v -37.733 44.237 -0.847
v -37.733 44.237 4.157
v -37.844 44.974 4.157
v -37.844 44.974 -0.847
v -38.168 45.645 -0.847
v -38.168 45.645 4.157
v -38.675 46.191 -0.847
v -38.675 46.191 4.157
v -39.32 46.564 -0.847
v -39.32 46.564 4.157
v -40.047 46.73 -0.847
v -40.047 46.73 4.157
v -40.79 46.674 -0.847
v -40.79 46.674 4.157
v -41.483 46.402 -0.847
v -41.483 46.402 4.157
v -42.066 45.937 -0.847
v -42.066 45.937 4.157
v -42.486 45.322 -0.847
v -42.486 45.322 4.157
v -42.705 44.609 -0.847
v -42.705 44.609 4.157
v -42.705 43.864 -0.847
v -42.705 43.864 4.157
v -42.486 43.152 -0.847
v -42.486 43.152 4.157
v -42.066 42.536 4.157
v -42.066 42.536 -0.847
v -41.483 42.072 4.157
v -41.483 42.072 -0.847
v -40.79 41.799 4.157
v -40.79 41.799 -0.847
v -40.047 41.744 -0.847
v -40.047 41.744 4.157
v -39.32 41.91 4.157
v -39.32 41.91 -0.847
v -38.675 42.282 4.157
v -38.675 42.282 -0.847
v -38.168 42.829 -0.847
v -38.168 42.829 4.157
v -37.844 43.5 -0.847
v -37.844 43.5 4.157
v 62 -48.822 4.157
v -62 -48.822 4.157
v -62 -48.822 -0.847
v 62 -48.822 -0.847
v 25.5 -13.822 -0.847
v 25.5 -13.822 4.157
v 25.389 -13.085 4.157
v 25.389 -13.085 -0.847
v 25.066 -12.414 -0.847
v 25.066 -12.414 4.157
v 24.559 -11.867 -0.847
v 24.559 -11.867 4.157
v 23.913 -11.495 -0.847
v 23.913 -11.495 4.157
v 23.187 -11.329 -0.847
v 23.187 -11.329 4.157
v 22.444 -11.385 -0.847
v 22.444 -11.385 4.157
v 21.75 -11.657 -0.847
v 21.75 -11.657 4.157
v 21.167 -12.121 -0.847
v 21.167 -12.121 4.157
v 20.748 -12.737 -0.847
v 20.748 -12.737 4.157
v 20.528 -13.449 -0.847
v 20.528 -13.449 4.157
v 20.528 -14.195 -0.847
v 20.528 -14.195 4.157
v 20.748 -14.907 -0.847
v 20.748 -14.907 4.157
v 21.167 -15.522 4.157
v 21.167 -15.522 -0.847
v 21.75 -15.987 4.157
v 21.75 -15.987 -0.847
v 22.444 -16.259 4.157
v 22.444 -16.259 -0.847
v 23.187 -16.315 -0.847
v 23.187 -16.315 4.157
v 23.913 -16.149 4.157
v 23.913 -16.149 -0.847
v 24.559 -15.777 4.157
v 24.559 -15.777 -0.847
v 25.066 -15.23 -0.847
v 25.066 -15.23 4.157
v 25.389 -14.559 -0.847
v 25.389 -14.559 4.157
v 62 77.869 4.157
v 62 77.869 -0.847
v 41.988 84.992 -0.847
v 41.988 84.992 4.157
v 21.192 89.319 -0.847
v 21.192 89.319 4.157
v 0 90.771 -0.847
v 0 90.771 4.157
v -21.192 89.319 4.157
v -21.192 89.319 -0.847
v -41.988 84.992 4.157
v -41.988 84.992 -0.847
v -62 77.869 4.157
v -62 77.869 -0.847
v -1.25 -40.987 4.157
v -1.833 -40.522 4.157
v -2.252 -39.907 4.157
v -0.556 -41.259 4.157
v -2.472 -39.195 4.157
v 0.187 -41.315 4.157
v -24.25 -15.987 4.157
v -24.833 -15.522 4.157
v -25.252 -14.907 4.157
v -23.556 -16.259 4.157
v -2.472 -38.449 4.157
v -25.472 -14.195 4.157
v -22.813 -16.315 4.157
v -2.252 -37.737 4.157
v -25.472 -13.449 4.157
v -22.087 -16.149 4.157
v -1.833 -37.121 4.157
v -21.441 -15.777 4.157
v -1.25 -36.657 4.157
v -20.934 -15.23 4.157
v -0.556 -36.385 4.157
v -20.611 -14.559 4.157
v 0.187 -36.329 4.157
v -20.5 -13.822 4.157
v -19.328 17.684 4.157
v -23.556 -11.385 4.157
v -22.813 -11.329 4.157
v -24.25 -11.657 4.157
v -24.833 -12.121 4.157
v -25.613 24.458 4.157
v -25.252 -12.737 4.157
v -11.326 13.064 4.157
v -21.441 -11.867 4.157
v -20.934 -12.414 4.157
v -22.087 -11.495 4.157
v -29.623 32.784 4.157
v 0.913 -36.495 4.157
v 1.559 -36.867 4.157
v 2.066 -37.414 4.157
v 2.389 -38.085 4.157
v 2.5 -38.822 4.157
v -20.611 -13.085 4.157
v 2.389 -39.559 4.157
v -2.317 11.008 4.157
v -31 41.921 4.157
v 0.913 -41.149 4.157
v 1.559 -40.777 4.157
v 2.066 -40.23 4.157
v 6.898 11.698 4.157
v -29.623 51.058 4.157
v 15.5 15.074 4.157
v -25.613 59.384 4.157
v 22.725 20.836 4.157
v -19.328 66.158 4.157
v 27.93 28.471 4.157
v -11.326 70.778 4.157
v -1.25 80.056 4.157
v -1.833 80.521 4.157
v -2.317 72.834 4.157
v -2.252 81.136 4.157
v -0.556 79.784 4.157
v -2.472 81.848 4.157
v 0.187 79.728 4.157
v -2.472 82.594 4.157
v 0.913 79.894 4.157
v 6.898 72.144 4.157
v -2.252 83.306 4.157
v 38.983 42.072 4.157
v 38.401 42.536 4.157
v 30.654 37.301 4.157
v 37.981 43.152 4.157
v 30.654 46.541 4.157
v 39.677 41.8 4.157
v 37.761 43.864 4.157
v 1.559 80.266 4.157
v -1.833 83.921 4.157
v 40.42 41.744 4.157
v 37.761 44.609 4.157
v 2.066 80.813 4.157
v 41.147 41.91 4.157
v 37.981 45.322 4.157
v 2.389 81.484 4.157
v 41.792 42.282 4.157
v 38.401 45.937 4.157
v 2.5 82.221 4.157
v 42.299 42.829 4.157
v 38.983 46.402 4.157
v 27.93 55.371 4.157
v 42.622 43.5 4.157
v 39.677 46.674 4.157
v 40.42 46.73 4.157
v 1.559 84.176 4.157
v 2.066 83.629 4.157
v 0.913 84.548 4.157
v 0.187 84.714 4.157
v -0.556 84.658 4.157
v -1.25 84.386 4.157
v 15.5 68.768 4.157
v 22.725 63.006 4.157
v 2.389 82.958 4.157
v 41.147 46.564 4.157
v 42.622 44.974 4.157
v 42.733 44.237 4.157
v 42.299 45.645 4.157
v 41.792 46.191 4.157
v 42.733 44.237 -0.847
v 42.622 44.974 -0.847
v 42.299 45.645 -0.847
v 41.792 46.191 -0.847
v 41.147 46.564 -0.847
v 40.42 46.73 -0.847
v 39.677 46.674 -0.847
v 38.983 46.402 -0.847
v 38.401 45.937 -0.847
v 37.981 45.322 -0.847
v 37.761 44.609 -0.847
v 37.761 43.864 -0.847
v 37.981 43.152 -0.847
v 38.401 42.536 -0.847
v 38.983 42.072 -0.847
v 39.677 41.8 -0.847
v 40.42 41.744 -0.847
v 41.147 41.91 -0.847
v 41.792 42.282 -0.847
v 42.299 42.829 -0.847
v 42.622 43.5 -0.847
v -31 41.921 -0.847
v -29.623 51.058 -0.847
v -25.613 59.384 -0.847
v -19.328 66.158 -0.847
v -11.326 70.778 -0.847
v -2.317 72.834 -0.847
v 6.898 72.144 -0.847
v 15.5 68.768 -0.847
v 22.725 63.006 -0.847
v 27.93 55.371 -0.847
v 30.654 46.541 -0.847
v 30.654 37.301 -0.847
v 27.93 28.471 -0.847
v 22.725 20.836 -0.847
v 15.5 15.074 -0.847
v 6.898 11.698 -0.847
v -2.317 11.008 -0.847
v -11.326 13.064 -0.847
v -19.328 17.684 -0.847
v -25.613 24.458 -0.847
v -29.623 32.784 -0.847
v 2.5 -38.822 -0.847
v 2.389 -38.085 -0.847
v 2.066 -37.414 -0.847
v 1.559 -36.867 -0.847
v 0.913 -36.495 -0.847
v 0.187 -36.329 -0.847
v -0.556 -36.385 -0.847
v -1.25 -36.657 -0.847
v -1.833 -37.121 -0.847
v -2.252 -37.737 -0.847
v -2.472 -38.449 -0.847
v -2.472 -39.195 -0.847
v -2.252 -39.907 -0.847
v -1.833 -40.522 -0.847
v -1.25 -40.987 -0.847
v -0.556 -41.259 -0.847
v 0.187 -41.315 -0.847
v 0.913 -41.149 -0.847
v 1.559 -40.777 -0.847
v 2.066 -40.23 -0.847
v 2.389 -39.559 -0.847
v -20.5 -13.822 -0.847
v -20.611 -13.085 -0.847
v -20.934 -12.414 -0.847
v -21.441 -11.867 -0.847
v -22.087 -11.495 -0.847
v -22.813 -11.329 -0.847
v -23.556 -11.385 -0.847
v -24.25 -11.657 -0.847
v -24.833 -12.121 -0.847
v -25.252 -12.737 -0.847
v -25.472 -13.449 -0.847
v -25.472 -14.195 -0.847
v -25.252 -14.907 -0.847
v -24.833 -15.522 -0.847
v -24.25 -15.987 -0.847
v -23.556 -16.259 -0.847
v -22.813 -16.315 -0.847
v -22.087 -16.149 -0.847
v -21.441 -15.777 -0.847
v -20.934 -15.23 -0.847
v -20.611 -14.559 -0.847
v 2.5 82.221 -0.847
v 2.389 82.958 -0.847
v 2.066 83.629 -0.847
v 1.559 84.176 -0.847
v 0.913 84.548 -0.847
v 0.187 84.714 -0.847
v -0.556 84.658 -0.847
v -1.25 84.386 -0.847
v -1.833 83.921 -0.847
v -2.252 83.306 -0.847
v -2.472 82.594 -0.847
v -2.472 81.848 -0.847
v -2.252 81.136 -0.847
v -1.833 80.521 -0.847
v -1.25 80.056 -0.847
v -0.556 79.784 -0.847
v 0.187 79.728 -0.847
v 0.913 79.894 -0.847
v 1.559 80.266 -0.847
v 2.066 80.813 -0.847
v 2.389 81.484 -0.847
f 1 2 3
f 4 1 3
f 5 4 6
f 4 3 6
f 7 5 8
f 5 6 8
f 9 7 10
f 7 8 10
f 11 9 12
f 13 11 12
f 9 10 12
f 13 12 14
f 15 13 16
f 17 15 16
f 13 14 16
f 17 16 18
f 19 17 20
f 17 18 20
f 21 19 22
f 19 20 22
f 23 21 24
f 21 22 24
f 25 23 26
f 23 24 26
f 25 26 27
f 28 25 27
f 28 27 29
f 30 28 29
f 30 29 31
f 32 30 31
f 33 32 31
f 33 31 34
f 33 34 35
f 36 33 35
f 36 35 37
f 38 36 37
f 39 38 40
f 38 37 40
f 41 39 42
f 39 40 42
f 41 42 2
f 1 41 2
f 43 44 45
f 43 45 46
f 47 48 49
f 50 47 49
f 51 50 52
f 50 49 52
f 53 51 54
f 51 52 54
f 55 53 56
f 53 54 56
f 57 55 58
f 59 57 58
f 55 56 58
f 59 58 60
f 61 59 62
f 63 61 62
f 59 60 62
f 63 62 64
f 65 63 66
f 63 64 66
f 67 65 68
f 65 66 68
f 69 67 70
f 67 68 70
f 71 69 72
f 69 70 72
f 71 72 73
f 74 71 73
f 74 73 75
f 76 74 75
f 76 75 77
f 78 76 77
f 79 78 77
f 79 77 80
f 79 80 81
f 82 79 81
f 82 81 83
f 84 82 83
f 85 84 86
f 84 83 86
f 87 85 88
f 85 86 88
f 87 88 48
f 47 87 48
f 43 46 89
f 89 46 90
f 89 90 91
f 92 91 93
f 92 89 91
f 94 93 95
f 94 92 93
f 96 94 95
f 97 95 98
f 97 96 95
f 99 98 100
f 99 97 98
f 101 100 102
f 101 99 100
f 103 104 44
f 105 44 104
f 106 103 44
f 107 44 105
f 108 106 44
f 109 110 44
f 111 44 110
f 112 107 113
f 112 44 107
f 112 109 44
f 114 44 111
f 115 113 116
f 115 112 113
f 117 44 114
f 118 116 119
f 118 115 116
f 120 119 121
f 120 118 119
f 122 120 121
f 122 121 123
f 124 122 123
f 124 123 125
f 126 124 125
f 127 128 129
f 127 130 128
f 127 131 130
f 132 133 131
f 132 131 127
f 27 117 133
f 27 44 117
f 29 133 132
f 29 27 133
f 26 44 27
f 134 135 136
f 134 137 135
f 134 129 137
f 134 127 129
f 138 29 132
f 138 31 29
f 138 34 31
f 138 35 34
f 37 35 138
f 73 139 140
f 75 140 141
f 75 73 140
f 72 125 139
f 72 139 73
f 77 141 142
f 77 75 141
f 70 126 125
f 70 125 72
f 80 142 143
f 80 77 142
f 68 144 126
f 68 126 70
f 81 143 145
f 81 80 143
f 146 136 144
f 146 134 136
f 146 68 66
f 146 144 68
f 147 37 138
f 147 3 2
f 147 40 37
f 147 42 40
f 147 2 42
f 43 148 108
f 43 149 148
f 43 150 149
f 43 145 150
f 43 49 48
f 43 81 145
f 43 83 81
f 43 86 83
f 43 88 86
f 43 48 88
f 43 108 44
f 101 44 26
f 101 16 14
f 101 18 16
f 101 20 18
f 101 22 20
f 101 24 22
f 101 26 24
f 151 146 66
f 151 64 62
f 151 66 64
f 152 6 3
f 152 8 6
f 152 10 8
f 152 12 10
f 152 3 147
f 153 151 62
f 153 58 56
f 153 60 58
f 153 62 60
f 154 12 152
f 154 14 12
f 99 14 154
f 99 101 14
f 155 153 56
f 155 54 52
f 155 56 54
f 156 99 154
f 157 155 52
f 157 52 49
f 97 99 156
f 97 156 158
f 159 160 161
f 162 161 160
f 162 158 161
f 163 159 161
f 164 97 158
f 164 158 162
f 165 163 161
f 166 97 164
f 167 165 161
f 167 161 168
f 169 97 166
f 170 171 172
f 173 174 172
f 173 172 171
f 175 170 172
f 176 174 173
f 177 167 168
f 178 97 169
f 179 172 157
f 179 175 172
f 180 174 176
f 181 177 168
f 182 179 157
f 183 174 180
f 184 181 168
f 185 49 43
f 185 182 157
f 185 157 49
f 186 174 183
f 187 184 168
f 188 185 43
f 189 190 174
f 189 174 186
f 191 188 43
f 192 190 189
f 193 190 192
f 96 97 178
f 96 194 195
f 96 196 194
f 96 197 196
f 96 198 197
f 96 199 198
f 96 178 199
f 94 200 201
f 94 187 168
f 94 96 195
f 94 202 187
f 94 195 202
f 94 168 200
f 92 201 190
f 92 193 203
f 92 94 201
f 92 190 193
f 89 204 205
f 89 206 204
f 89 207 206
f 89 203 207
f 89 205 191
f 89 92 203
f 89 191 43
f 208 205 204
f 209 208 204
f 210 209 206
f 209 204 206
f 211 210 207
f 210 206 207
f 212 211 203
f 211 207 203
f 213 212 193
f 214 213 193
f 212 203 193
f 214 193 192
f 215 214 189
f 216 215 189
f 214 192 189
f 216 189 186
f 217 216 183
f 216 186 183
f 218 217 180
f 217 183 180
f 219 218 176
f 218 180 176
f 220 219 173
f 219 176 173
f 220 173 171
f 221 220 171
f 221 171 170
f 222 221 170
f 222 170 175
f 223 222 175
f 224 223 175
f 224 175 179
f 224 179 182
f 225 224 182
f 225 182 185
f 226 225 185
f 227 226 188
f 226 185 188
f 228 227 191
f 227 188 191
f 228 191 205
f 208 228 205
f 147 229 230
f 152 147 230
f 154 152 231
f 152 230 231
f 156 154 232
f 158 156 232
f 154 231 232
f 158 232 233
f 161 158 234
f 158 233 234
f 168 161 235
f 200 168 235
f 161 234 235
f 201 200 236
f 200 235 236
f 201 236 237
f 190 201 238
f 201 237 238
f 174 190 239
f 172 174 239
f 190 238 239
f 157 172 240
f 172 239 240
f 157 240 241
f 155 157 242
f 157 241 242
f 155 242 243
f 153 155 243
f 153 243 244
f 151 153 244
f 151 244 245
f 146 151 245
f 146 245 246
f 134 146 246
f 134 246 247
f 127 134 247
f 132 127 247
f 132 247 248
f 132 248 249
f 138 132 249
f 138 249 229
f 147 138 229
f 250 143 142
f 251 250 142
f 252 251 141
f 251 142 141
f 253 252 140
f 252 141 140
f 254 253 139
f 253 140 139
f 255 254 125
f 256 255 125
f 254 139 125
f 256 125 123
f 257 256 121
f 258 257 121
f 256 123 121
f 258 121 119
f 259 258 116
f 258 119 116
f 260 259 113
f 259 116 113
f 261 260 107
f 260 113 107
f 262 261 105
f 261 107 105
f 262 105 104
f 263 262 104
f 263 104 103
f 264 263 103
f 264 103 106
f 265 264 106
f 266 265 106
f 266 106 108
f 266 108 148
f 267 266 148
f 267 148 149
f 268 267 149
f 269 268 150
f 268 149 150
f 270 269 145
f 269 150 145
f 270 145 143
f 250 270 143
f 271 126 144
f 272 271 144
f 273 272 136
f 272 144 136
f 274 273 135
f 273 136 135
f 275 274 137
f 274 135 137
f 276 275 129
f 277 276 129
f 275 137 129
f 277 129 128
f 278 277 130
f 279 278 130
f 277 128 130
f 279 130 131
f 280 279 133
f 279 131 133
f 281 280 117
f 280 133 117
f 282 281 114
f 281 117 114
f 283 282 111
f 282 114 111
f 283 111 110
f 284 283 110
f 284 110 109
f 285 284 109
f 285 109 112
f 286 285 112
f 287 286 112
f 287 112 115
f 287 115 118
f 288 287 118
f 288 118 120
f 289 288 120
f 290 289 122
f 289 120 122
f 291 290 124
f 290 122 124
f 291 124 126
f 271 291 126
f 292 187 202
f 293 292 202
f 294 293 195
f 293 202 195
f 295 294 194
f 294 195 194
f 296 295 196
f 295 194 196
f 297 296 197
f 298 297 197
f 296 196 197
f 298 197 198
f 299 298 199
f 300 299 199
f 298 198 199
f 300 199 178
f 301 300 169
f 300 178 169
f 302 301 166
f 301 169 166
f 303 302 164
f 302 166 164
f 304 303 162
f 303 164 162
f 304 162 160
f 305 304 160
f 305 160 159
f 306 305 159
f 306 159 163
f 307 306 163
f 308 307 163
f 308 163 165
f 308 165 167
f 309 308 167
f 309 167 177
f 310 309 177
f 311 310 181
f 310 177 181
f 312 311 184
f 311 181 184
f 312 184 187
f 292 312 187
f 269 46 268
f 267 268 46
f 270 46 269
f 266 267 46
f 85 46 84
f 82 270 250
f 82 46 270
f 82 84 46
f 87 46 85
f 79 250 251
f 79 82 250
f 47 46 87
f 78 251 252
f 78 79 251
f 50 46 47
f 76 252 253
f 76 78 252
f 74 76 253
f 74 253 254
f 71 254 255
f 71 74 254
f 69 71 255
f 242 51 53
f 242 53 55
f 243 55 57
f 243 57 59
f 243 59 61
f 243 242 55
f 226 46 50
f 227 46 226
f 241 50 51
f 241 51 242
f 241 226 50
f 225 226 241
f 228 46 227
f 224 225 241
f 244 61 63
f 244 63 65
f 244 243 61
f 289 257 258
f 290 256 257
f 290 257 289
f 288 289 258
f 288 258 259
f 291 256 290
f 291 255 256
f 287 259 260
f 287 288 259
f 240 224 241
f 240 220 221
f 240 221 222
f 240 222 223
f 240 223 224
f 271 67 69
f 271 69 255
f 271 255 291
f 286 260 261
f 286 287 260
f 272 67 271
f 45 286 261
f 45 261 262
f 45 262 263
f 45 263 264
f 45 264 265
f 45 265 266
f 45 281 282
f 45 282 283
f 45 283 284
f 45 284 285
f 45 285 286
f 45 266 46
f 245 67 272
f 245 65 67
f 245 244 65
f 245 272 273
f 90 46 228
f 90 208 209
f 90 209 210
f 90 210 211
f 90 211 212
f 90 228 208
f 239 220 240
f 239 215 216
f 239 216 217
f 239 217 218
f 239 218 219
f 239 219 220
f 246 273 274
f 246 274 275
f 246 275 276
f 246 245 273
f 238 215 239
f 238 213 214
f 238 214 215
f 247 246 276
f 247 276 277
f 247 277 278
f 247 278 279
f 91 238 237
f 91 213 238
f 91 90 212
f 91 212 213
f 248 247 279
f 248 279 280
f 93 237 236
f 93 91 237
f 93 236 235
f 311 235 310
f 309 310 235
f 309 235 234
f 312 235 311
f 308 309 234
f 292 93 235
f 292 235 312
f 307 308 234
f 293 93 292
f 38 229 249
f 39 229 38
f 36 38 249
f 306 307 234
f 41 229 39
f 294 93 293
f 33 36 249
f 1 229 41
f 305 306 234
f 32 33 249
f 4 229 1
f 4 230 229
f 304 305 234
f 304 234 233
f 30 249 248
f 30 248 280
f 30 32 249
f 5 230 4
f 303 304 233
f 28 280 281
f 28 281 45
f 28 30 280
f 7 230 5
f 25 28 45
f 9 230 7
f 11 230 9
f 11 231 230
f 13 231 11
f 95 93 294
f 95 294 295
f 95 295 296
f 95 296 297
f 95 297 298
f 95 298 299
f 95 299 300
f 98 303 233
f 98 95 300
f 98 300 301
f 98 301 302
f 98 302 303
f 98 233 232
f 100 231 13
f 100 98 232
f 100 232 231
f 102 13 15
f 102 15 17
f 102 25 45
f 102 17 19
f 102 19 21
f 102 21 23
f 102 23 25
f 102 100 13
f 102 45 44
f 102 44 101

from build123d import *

# Parameters (mm, degrees)
SKETCH1_W           = 70
SKETCH1_H           = 105
BOSS_EXTRUDE1_DEPTH = 3
SKETCH2_R           = 17.5
CUT_EXTRUDE3_DEPTH  = 3
CUT_EXTRUDE6_DEPTH  = 10
SCALE1_SCALE        = 1.771428571
SKETCH6_R           = 30.999999993
CUT_EXTRUDE7_DEPTH  = 0.31
SKETCH7_W           = 123.99999997
SKETCH7_H           = 38.57142855
CUT_EXTRUDE8_DEPTH  = 10
SKETCH9_R           = 2.5
CUT_EXTRUDE9_DEPTH  = 5.004285713
SKETCH10_R          = 2.5
CUT_EXTRUDE10_DEPTH = 5.004285713


with BuildPart() as part:
    # Sketch1 → Boss-Extrude1 (new body)
    with BuildSketch(Plane.XY):
        Rectangle(SKETCH1_W, SKETCH1_H)
    extrude(amount=BOSS_EXTRUDE1_DEPTH)

    # Sketch2 → Cut-Extrude3 (cut)
    with BuildSketch(Plane(origin=(0, 0, 0), x_dir=(-1, 0, 0), z_dir=(0, 0, -1))):
        with Locations((0, 20.5)):
            Circle(SKETCH2_R)
    extrude(amount=-CUT_EXTRUDE3_DEPTH, mode=Mode.SUBTRACT)

    # Sketch5 → Cut-Extrude6 (cut)
    with BuildSketch(Plane.XY.offset(3)):
        with BuildLine():
            Line((-35, 40.793543502), (-35, 52.5))
            Line((-35, 52.5), (35, 52.5))
            Line((35, 52.5), (35, 40.793543502))
            ThreePointArc((35, 40.793543502), (0, 48.07644174), (-35, 40.793543502))
        make_face()
    extrude(amount=-CUT_EXTRUDE6_DEPTH, mode=Mode.SUBTRACT)


with BuildPart() as part_1:
    # Scale1: scaled about (0, -7.267874882, 1.5)
    add(part.part.scale(SCALE1_SCALE).moved(Location((0, 5.606646334, -1.157142856))))

    # Sketch6 → Cut-Extrude7 (cut)
    with BuildSketch(Plane(origin=(0, 0, -1.157142856), x_dir=(-1, 0, 0), z_dir=(0, 0, -1))):
        with BuildLine():
            Line((61.999999985, -87.393353643), (61.999999985, 77.869494806))
            ThreePointArc((61.999999985, 77.869494806), (0, 90.770628825), (-61.999999985, 77.869494806))
            Line((-61.999999985, 77.869494806), (-61.999999985, -87.393353643))
            Line((-61.999999985, -87.393353643), (61.999999985, -87.393353643))
        make_face()
        with Locations((0, 41.92093204)):
            Circle(SKETCH6_R, mode=Mode.SUBTRACT)
    extrude(amount=-CUT_EXTRUDE7_DEPTH, mode=Mode.SUBTRACT)

    # Sketch7 → Cut-Extrude8 (cut)
    with BuildSketch(Plane.XY.offset(4.157142857)):
        with Locations((0, -68.107639368)):
            Rectangle(SKETCH7_W, SKETCH7_H)
    extrude(amount=-CUT_EXTRUDE8_DEPTH, mode=Mode.SUBTRACT)

    # Sketch9 → Cut-Extrude9 (cut)
    with BuildSketch(Plane.XY.offset(4.157142857)):
        with Locations((23, -13.821925093)):
            Circle(SKETCH9_R)
        with Locations((-23, -13.821925093)):
            Circle(SKETCH9_R)
        with Locations((0, -38.821925093)):
            Circle(SKETCH9_R)
    extrude(amount=-CUT_EXTRUDE9_DEPTH, mode=Mode.SUBTRACT)

    # Sketch10 → Cut-Extrude10 (cut)
    with BuildSketch(Plane.XY.offset(4.157142857)):
        with Locations((-40.233402491, 44.236817184)):
            Circle(SKETCH10_R)
        with Locations((0, 82.22093204)):
            Circle(SKETCH10_R)
        with Locations((40.233400771, 44.236847056)):
            Circle(SKETCH10_R)
    extrude(amount=-CUT_EXTRUDE10_DEPTH, mode=Mode.SUBTRACT)


solid = part_1.part
